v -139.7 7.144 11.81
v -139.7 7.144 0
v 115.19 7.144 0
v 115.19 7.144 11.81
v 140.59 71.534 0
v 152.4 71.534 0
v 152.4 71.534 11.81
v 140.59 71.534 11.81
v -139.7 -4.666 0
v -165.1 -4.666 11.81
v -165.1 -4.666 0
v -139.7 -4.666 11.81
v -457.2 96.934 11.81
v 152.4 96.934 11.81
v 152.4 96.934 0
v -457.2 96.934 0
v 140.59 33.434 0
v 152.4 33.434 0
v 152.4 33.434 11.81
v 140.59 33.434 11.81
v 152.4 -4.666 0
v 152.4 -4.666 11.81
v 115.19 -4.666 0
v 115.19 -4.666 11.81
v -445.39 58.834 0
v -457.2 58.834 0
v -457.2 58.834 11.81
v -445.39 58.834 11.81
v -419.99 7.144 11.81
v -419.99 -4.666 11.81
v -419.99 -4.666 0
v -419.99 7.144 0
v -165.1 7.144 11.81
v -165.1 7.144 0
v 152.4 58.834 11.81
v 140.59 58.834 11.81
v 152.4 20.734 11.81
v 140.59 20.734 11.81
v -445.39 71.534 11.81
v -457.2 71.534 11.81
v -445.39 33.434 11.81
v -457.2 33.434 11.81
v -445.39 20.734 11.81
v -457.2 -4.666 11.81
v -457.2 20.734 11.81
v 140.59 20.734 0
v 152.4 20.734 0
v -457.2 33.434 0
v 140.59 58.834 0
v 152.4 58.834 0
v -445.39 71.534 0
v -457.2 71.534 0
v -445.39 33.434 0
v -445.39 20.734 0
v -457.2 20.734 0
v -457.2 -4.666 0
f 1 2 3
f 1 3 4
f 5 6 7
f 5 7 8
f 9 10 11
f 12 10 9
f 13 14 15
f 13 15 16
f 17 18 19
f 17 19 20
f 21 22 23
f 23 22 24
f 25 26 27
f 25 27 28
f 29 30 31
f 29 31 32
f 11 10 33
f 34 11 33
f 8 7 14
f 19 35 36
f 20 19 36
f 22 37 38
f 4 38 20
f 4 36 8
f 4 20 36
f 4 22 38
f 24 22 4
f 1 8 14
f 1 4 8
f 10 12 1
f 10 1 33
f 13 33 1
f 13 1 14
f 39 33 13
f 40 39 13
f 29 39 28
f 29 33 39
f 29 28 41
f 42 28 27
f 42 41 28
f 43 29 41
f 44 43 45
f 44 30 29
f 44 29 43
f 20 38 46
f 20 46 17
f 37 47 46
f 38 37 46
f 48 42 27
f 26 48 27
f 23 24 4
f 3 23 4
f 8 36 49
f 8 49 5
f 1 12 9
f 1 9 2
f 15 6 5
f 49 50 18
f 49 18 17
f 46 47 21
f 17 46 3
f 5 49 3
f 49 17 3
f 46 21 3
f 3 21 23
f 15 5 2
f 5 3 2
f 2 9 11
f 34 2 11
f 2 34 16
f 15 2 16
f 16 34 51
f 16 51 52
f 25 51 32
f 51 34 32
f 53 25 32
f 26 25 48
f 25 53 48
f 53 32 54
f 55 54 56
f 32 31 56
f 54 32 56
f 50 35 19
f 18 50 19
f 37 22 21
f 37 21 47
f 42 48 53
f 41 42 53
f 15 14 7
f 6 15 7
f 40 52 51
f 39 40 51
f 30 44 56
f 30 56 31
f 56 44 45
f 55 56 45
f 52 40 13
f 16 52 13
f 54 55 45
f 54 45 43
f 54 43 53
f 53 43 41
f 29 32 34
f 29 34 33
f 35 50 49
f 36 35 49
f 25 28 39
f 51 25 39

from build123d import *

# Parameters (mm, degrees)
BOSS_EXTRUDE1_START     = -445.39
BOSS_EXTRUDE1_OUTLINE_W = 89.79
BOSS_EXTRUDE1_OUTLINE_H = 11.81
BOSS_EXTRUDE1_DEPTH     = 585.980036335
JOINT_X_W               = 25.4
JOINT_X_H               = 11.81
BOSS_EXTRUDE2_DEPTH     = 11.81
LPATTERN1_COUNT         = 3
LPATTERN1_PITCH         = 280.290018167
JOINT_Y_W               = 11.81
JOINT_Y_H               = 25.4
BOSS_EXTRUDE3_DEPTH     = 11.81
LPATTERN2_COUNT         = 3
LPATTERN2_PITCH         = 38.1
MIRROR3_COPY_1_SKETCH_W = 11.81
MIRROR3_COPY_1_SKETCH_H = 25.4
MIRROR3_COPY_1_DEPTH    = 11.81
MIRROR3_COPY_2_SKETCH_W = 11.81
MIRROR3_COPY_2_SKETCH_H = 25.4
MIRROR3_COPY_2_DEPTH    = 11.81


# Read off the part's stored shape, not the designer's step: Boss-Extrude1
with BuildPart() as part:
    # Boss-Extrude1 outline → Boss-Extrude1 (new body)
    with BuildSketch(Plane.YZ.offset(BOSS_EXTRUDE1_START)):
        with Locations((52.039215162, 5.905)):
            Rectangle(BOSS_EXTRUDE1_OUTLINE_W, BOSS_EXTRUDE1_OUTLINE_H)
    extrude(amount=BOSS_EXTRUDE1_DEPTH)

    # Joint_X → Boss-Extrude2 (add)
    with BuildSketch(Plane.XY.offset(11.81)):
        with Locations((-432.69, 1.239215162)):
            Rectangle(JOINT_X_W, JOINT_X_H)
    boss_extrude2 = extrude(amount=-BOSS_EXTRUDE2_DEPTH)

    # LPattern1: Boss-Extrude2 ×3
    with Locations(*[(i * LPATTERN1_PITCH, 0, 0) for i in range(1, LPATTERN1_COUNT)]):
        add(boss_extrude2)

    # Joint_Y → Boss-Extrude3 (add)
    with BuildSketch(Plane.XY.offset(11.81)):
        with Locations((-451.295, 8.034215162)):
            Rectangle(JOINT_Y_W, JOINT_Y_H)
    boss_extrude3 = extrude(amount=-BOSS_EXTRUDE3_DEPTH)

    # LPattern2: Boss-Extrude3 ×3
    with Locations(*[(0, i * LPATTERN2_PITCH, 0) for i in range(1, LPATTERN2_COUNT)]):
        add(boss_extrude3)

    # Mirror3: Boss-Extrude3 across plane
    add(boss_extrude3.mirror(Plane.ZY.offset(152.399981833)))

    # Mirror3 copy 1 sketch → Mirror3 copy 1 (add)
    with BuildSketch(Plane(origin=(-304.799963665, 38.1, 11.81), x_dir=(-1, 0, 0), z_dir=(0, 0, 1))):
        with Locations((-451.295, -8.034215162)):
            Rectangle(MIRROR3_COPY_1_SKETCH_W, MIRROR3_COPY_1_SKETCH_H)
    extrude(amount=-MIRROR3_COPY_1_DEPTH)

    # Mirror3 copy 2 sketch → Mirror3 copy 2 (add)
    with BuildSketch(Plane(origin=(-304.799963665, 76.2, 11.81), x_dir=(-1, 0, 0), z_dir=(0, 0, 1))):
        with Locations((-451.295, -8.034215162)):
            Rectangle(MIRROR3_COPY_2_SKETCH_W, MIRROR3_COPY_2_SKETCH_H)
    extrude(amount=-MIRROR3_COPY_2_DEPTH)


solid = part.part
